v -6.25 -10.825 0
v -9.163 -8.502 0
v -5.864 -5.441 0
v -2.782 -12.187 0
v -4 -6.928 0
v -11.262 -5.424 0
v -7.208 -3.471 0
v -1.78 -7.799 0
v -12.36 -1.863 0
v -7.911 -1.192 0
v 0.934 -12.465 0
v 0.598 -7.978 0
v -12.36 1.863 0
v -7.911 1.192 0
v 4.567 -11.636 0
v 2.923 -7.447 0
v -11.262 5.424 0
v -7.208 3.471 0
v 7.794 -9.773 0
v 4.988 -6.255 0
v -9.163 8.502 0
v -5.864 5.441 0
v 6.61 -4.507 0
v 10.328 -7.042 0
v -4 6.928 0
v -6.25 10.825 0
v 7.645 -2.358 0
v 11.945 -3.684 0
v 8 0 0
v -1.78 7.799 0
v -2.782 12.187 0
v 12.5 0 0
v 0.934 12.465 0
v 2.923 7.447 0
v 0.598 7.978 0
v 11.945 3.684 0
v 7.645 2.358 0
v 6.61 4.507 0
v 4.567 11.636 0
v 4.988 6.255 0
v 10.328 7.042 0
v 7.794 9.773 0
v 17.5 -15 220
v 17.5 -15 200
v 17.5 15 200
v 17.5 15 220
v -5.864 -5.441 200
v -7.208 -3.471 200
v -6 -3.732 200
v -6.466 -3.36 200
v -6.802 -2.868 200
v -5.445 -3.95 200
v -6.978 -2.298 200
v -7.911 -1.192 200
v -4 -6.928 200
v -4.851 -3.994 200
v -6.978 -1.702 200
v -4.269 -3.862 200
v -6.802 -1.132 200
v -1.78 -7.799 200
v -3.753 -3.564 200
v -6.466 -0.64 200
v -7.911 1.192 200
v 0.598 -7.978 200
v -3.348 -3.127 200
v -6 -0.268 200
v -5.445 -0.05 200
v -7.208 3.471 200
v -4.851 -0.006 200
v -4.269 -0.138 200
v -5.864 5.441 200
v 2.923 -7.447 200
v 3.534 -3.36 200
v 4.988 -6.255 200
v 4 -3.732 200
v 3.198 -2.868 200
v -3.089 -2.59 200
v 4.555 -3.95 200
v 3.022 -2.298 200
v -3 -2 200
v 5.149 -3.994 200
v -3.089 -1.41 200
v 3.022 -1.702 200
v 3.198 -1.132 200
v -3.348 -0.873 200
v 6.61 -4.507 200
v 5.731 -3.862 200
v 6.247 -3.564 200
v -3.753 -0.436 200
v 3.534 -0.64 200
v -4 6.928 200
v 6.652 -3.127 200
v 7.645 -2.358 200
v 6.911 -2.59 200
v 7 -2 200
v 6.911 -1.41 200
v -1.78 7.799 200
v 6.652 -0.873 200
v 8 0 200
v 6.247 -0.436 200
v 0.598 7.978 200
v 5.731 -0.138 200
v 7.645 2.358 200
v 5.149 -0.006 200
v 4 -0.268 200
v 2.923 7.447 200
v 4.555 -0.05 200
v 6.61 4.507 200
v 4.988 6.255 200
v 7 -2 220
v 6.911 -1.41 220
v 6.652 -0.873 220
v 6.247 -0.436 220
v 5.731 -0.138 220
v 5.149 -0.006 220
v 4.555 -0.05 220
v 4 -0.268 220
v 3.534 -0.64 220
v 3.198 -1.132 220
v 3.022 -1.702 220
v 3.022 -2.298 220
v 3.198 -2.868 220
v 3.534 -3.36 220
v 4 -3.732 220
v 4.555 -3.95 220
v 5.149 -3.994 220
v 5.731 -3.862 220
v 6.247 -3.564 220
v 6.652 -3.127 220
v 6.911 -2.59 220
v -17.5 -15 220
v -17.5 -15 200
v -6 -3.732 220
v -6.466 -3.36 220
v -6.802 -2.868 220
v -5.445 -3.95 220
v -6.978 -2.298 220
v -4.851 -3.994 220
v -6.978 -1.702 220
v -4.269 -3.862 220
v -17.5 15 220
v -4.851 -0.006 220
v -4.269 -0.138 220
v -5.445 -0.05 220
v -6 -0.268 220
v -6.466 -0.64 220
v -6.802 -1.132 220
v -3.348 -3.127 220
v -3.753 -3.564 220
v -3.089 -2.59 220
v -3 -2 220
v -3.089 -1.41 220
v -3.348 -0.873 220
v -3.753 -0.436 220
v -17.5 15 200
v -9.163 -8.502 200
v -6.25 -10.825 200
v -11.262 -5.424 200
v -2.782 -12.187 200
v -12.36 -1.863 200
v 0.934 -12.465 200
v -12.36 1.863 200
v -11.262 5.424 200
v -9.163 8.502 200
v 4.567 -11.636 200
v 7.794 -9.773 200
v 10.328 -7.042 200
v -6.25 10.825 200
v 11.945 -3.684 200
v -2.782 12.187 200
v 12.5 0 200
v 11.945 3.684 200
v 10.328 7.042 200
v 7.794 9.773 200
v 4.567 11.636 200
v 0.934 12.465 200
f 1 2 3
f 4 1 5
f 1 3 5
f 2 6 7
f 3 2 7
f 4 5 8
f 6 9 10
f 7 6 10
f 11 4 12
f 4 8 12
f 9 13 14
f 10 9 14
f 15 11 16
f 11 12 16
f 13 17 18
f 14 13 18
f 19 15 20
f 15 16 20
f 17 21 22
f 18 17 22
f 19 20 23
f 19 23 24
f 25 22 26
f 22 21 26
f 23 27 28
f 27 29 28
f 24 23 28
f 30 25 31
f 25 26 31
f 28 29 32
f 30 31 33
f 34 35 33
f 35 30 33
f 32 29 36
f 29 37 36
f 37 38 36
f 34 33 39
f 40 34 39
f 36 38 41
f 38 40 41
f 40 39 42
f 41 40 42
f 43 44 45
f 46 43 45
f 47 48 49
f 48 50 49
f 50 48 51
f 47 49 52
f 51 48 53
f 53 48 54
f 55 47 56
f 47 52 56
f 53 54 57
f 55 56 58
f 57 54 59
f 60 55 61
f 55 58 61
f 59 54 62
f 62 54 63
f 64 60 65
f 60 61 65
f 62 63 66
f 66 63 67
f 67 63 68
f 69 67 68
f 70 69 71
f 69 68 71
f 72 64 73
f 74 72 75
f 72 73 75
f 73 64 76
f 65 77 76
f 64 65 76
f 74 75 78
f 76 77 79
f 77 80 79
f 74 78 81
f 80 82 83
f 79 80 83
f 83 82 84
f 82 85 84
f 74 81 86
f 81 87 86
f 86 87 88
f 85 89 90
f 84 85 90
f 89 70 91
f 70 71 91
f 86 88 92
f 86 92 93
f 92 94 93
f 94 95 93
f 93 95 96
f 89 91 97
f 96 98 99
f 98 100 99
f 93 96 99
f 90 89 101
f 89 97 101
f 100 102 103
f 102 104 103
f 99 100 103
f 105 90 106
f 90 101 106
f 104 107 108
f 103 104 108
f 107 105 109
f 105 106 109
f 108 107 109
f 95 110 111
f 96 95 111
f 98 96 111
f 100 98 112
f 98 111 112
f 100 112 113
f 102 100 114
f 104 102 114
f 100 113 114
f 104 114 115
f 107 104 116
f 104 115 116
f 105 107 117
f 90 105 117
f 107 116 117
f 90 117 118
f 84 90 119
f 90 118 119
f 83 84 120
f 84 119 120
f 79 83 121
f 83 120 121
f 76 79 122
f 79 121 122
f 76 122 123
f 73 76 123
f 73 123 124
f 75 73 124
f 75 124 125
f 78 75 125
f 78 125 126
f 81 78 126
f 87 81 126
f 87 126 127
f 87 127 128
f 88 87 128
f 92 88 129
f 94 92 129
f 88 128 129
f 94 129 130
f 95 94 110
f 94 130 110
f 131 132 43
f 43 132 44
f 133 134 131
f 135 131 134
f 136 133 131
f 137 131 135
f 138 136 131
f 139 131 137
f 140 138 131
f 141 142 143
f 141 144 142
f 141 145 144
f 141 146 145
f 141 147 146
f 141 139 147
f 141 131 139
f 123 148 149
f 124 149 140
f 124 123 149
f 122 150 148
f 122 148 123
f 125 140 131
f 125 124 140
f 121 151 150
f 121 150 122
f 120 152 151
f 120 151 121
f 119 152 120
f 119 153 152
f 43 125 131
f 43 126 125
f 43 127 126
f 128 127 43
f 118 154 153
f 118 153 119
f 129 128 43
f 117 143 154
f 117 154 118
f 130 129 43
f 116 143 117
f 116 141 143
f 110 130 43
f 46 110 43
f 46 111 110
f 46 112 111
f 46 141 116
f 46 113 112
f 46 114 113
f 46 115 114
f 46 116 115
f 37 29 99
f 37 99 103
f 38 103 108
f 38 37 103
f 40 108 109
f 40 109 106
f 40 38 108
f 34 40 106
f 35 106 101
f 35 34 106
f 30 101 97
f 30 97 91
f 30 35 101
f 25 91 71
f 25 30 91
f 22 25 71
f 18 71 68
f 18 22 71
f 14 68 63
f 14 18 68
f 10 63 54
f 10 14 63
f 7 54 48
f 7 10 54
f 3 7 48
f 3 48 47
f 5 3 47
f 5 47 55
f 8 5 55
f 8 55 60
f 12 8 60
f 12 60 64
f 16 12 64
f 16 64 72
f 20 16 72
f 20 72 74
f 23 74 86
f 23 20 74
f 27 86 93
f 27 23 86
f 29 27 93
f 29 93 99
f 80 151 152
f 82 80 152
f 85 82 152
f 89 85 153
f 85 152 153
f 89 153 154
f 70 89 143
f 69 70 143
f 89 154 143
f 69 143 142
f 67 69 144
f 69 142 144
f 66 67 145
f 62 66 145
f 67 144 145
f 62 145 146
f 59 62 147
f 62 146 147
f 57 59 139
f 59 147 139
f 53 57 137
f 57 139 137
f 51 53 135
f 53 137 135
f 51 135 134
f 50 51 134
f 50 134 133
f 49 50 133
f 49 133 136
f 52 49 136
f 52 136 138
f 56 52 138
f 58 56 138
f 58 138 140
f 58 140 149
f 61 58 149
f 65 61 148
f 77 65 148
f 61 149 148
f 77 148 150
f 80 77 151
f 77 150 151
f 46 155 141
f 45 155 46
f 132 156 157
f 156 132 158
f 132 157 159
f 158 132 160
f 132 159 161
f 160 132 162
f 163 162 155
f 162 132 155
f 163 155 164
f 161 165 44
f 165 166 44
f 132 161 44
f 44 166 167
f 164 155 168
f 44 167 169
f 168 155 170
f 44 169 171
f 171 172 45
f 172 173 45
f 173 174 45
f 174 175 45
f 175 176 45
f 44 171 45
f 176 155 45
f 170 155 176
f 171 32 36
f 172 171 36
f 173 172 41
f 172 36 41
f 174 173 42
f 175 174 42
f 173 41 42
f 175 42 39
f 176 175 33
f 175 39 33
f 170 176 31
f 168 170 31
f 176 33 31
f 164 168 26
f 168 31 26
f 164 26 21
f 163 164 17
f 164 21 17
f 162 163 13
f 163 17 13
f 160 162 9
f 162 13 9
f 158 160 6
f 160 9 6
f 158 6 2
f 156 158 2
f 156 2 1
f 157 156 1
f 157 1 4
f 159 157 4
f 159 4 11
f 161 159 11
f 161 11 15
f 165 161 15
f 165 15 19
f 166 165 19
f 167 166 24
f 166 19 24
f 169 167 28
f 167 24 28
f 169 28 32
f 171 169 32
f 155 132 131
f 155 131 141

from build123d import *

# Parameters (mm, degrees)
ESQUISSE1_R             = 12.5
ESQUISSE1_R_2           = 8
BOSS_EXTRU_1_DEPTH      = 200
ESQUISSE2_W             = 35
ESQUISSE2_H             = 30
BOSS_EXTRU_2_DEPTH      = 20
ESQUISSE3_R             = 2
ENL_V_MAT_EXTRU_1_DEPTH = 20


with BuildPart() as part:
    # Esquisse1 → Boss.-Extru.1 (new body)
    with BuildSketch(Plane.XY):
        Circle(ESQUISSE1_R)
        Circle(ESQUISSE1_R_2, mode=Mode.SUBTRACT)
    extrude(amount=BOSS_EXTRU_1_DEPTH)

    # Esquisse2 → Boss.-Extru.2 (add)
    with BuildSketch(Plane.XY.offset(200)):
        Rectangle(ESQUISSE2_W, ESQUISSE2_H)
    extrude(amount=BOSS_EXTRU_2_DEPTH)

    # Esquisse3 → Enlèv. mat.-Extru.1 (cut)
    with BuildSketch(Plane.XY.offset(220)):
        with Locations((5, -2)):
            Circle(ESQUISSE3_R)
        with Locations((-5, -2)):
            Circle(ESQUISSE3_R)
    extrude(amount=-ENL_V_MAT_EXTRU_1_DEPTH, mode=Mode.SUBTRACT)


solid = part.part
